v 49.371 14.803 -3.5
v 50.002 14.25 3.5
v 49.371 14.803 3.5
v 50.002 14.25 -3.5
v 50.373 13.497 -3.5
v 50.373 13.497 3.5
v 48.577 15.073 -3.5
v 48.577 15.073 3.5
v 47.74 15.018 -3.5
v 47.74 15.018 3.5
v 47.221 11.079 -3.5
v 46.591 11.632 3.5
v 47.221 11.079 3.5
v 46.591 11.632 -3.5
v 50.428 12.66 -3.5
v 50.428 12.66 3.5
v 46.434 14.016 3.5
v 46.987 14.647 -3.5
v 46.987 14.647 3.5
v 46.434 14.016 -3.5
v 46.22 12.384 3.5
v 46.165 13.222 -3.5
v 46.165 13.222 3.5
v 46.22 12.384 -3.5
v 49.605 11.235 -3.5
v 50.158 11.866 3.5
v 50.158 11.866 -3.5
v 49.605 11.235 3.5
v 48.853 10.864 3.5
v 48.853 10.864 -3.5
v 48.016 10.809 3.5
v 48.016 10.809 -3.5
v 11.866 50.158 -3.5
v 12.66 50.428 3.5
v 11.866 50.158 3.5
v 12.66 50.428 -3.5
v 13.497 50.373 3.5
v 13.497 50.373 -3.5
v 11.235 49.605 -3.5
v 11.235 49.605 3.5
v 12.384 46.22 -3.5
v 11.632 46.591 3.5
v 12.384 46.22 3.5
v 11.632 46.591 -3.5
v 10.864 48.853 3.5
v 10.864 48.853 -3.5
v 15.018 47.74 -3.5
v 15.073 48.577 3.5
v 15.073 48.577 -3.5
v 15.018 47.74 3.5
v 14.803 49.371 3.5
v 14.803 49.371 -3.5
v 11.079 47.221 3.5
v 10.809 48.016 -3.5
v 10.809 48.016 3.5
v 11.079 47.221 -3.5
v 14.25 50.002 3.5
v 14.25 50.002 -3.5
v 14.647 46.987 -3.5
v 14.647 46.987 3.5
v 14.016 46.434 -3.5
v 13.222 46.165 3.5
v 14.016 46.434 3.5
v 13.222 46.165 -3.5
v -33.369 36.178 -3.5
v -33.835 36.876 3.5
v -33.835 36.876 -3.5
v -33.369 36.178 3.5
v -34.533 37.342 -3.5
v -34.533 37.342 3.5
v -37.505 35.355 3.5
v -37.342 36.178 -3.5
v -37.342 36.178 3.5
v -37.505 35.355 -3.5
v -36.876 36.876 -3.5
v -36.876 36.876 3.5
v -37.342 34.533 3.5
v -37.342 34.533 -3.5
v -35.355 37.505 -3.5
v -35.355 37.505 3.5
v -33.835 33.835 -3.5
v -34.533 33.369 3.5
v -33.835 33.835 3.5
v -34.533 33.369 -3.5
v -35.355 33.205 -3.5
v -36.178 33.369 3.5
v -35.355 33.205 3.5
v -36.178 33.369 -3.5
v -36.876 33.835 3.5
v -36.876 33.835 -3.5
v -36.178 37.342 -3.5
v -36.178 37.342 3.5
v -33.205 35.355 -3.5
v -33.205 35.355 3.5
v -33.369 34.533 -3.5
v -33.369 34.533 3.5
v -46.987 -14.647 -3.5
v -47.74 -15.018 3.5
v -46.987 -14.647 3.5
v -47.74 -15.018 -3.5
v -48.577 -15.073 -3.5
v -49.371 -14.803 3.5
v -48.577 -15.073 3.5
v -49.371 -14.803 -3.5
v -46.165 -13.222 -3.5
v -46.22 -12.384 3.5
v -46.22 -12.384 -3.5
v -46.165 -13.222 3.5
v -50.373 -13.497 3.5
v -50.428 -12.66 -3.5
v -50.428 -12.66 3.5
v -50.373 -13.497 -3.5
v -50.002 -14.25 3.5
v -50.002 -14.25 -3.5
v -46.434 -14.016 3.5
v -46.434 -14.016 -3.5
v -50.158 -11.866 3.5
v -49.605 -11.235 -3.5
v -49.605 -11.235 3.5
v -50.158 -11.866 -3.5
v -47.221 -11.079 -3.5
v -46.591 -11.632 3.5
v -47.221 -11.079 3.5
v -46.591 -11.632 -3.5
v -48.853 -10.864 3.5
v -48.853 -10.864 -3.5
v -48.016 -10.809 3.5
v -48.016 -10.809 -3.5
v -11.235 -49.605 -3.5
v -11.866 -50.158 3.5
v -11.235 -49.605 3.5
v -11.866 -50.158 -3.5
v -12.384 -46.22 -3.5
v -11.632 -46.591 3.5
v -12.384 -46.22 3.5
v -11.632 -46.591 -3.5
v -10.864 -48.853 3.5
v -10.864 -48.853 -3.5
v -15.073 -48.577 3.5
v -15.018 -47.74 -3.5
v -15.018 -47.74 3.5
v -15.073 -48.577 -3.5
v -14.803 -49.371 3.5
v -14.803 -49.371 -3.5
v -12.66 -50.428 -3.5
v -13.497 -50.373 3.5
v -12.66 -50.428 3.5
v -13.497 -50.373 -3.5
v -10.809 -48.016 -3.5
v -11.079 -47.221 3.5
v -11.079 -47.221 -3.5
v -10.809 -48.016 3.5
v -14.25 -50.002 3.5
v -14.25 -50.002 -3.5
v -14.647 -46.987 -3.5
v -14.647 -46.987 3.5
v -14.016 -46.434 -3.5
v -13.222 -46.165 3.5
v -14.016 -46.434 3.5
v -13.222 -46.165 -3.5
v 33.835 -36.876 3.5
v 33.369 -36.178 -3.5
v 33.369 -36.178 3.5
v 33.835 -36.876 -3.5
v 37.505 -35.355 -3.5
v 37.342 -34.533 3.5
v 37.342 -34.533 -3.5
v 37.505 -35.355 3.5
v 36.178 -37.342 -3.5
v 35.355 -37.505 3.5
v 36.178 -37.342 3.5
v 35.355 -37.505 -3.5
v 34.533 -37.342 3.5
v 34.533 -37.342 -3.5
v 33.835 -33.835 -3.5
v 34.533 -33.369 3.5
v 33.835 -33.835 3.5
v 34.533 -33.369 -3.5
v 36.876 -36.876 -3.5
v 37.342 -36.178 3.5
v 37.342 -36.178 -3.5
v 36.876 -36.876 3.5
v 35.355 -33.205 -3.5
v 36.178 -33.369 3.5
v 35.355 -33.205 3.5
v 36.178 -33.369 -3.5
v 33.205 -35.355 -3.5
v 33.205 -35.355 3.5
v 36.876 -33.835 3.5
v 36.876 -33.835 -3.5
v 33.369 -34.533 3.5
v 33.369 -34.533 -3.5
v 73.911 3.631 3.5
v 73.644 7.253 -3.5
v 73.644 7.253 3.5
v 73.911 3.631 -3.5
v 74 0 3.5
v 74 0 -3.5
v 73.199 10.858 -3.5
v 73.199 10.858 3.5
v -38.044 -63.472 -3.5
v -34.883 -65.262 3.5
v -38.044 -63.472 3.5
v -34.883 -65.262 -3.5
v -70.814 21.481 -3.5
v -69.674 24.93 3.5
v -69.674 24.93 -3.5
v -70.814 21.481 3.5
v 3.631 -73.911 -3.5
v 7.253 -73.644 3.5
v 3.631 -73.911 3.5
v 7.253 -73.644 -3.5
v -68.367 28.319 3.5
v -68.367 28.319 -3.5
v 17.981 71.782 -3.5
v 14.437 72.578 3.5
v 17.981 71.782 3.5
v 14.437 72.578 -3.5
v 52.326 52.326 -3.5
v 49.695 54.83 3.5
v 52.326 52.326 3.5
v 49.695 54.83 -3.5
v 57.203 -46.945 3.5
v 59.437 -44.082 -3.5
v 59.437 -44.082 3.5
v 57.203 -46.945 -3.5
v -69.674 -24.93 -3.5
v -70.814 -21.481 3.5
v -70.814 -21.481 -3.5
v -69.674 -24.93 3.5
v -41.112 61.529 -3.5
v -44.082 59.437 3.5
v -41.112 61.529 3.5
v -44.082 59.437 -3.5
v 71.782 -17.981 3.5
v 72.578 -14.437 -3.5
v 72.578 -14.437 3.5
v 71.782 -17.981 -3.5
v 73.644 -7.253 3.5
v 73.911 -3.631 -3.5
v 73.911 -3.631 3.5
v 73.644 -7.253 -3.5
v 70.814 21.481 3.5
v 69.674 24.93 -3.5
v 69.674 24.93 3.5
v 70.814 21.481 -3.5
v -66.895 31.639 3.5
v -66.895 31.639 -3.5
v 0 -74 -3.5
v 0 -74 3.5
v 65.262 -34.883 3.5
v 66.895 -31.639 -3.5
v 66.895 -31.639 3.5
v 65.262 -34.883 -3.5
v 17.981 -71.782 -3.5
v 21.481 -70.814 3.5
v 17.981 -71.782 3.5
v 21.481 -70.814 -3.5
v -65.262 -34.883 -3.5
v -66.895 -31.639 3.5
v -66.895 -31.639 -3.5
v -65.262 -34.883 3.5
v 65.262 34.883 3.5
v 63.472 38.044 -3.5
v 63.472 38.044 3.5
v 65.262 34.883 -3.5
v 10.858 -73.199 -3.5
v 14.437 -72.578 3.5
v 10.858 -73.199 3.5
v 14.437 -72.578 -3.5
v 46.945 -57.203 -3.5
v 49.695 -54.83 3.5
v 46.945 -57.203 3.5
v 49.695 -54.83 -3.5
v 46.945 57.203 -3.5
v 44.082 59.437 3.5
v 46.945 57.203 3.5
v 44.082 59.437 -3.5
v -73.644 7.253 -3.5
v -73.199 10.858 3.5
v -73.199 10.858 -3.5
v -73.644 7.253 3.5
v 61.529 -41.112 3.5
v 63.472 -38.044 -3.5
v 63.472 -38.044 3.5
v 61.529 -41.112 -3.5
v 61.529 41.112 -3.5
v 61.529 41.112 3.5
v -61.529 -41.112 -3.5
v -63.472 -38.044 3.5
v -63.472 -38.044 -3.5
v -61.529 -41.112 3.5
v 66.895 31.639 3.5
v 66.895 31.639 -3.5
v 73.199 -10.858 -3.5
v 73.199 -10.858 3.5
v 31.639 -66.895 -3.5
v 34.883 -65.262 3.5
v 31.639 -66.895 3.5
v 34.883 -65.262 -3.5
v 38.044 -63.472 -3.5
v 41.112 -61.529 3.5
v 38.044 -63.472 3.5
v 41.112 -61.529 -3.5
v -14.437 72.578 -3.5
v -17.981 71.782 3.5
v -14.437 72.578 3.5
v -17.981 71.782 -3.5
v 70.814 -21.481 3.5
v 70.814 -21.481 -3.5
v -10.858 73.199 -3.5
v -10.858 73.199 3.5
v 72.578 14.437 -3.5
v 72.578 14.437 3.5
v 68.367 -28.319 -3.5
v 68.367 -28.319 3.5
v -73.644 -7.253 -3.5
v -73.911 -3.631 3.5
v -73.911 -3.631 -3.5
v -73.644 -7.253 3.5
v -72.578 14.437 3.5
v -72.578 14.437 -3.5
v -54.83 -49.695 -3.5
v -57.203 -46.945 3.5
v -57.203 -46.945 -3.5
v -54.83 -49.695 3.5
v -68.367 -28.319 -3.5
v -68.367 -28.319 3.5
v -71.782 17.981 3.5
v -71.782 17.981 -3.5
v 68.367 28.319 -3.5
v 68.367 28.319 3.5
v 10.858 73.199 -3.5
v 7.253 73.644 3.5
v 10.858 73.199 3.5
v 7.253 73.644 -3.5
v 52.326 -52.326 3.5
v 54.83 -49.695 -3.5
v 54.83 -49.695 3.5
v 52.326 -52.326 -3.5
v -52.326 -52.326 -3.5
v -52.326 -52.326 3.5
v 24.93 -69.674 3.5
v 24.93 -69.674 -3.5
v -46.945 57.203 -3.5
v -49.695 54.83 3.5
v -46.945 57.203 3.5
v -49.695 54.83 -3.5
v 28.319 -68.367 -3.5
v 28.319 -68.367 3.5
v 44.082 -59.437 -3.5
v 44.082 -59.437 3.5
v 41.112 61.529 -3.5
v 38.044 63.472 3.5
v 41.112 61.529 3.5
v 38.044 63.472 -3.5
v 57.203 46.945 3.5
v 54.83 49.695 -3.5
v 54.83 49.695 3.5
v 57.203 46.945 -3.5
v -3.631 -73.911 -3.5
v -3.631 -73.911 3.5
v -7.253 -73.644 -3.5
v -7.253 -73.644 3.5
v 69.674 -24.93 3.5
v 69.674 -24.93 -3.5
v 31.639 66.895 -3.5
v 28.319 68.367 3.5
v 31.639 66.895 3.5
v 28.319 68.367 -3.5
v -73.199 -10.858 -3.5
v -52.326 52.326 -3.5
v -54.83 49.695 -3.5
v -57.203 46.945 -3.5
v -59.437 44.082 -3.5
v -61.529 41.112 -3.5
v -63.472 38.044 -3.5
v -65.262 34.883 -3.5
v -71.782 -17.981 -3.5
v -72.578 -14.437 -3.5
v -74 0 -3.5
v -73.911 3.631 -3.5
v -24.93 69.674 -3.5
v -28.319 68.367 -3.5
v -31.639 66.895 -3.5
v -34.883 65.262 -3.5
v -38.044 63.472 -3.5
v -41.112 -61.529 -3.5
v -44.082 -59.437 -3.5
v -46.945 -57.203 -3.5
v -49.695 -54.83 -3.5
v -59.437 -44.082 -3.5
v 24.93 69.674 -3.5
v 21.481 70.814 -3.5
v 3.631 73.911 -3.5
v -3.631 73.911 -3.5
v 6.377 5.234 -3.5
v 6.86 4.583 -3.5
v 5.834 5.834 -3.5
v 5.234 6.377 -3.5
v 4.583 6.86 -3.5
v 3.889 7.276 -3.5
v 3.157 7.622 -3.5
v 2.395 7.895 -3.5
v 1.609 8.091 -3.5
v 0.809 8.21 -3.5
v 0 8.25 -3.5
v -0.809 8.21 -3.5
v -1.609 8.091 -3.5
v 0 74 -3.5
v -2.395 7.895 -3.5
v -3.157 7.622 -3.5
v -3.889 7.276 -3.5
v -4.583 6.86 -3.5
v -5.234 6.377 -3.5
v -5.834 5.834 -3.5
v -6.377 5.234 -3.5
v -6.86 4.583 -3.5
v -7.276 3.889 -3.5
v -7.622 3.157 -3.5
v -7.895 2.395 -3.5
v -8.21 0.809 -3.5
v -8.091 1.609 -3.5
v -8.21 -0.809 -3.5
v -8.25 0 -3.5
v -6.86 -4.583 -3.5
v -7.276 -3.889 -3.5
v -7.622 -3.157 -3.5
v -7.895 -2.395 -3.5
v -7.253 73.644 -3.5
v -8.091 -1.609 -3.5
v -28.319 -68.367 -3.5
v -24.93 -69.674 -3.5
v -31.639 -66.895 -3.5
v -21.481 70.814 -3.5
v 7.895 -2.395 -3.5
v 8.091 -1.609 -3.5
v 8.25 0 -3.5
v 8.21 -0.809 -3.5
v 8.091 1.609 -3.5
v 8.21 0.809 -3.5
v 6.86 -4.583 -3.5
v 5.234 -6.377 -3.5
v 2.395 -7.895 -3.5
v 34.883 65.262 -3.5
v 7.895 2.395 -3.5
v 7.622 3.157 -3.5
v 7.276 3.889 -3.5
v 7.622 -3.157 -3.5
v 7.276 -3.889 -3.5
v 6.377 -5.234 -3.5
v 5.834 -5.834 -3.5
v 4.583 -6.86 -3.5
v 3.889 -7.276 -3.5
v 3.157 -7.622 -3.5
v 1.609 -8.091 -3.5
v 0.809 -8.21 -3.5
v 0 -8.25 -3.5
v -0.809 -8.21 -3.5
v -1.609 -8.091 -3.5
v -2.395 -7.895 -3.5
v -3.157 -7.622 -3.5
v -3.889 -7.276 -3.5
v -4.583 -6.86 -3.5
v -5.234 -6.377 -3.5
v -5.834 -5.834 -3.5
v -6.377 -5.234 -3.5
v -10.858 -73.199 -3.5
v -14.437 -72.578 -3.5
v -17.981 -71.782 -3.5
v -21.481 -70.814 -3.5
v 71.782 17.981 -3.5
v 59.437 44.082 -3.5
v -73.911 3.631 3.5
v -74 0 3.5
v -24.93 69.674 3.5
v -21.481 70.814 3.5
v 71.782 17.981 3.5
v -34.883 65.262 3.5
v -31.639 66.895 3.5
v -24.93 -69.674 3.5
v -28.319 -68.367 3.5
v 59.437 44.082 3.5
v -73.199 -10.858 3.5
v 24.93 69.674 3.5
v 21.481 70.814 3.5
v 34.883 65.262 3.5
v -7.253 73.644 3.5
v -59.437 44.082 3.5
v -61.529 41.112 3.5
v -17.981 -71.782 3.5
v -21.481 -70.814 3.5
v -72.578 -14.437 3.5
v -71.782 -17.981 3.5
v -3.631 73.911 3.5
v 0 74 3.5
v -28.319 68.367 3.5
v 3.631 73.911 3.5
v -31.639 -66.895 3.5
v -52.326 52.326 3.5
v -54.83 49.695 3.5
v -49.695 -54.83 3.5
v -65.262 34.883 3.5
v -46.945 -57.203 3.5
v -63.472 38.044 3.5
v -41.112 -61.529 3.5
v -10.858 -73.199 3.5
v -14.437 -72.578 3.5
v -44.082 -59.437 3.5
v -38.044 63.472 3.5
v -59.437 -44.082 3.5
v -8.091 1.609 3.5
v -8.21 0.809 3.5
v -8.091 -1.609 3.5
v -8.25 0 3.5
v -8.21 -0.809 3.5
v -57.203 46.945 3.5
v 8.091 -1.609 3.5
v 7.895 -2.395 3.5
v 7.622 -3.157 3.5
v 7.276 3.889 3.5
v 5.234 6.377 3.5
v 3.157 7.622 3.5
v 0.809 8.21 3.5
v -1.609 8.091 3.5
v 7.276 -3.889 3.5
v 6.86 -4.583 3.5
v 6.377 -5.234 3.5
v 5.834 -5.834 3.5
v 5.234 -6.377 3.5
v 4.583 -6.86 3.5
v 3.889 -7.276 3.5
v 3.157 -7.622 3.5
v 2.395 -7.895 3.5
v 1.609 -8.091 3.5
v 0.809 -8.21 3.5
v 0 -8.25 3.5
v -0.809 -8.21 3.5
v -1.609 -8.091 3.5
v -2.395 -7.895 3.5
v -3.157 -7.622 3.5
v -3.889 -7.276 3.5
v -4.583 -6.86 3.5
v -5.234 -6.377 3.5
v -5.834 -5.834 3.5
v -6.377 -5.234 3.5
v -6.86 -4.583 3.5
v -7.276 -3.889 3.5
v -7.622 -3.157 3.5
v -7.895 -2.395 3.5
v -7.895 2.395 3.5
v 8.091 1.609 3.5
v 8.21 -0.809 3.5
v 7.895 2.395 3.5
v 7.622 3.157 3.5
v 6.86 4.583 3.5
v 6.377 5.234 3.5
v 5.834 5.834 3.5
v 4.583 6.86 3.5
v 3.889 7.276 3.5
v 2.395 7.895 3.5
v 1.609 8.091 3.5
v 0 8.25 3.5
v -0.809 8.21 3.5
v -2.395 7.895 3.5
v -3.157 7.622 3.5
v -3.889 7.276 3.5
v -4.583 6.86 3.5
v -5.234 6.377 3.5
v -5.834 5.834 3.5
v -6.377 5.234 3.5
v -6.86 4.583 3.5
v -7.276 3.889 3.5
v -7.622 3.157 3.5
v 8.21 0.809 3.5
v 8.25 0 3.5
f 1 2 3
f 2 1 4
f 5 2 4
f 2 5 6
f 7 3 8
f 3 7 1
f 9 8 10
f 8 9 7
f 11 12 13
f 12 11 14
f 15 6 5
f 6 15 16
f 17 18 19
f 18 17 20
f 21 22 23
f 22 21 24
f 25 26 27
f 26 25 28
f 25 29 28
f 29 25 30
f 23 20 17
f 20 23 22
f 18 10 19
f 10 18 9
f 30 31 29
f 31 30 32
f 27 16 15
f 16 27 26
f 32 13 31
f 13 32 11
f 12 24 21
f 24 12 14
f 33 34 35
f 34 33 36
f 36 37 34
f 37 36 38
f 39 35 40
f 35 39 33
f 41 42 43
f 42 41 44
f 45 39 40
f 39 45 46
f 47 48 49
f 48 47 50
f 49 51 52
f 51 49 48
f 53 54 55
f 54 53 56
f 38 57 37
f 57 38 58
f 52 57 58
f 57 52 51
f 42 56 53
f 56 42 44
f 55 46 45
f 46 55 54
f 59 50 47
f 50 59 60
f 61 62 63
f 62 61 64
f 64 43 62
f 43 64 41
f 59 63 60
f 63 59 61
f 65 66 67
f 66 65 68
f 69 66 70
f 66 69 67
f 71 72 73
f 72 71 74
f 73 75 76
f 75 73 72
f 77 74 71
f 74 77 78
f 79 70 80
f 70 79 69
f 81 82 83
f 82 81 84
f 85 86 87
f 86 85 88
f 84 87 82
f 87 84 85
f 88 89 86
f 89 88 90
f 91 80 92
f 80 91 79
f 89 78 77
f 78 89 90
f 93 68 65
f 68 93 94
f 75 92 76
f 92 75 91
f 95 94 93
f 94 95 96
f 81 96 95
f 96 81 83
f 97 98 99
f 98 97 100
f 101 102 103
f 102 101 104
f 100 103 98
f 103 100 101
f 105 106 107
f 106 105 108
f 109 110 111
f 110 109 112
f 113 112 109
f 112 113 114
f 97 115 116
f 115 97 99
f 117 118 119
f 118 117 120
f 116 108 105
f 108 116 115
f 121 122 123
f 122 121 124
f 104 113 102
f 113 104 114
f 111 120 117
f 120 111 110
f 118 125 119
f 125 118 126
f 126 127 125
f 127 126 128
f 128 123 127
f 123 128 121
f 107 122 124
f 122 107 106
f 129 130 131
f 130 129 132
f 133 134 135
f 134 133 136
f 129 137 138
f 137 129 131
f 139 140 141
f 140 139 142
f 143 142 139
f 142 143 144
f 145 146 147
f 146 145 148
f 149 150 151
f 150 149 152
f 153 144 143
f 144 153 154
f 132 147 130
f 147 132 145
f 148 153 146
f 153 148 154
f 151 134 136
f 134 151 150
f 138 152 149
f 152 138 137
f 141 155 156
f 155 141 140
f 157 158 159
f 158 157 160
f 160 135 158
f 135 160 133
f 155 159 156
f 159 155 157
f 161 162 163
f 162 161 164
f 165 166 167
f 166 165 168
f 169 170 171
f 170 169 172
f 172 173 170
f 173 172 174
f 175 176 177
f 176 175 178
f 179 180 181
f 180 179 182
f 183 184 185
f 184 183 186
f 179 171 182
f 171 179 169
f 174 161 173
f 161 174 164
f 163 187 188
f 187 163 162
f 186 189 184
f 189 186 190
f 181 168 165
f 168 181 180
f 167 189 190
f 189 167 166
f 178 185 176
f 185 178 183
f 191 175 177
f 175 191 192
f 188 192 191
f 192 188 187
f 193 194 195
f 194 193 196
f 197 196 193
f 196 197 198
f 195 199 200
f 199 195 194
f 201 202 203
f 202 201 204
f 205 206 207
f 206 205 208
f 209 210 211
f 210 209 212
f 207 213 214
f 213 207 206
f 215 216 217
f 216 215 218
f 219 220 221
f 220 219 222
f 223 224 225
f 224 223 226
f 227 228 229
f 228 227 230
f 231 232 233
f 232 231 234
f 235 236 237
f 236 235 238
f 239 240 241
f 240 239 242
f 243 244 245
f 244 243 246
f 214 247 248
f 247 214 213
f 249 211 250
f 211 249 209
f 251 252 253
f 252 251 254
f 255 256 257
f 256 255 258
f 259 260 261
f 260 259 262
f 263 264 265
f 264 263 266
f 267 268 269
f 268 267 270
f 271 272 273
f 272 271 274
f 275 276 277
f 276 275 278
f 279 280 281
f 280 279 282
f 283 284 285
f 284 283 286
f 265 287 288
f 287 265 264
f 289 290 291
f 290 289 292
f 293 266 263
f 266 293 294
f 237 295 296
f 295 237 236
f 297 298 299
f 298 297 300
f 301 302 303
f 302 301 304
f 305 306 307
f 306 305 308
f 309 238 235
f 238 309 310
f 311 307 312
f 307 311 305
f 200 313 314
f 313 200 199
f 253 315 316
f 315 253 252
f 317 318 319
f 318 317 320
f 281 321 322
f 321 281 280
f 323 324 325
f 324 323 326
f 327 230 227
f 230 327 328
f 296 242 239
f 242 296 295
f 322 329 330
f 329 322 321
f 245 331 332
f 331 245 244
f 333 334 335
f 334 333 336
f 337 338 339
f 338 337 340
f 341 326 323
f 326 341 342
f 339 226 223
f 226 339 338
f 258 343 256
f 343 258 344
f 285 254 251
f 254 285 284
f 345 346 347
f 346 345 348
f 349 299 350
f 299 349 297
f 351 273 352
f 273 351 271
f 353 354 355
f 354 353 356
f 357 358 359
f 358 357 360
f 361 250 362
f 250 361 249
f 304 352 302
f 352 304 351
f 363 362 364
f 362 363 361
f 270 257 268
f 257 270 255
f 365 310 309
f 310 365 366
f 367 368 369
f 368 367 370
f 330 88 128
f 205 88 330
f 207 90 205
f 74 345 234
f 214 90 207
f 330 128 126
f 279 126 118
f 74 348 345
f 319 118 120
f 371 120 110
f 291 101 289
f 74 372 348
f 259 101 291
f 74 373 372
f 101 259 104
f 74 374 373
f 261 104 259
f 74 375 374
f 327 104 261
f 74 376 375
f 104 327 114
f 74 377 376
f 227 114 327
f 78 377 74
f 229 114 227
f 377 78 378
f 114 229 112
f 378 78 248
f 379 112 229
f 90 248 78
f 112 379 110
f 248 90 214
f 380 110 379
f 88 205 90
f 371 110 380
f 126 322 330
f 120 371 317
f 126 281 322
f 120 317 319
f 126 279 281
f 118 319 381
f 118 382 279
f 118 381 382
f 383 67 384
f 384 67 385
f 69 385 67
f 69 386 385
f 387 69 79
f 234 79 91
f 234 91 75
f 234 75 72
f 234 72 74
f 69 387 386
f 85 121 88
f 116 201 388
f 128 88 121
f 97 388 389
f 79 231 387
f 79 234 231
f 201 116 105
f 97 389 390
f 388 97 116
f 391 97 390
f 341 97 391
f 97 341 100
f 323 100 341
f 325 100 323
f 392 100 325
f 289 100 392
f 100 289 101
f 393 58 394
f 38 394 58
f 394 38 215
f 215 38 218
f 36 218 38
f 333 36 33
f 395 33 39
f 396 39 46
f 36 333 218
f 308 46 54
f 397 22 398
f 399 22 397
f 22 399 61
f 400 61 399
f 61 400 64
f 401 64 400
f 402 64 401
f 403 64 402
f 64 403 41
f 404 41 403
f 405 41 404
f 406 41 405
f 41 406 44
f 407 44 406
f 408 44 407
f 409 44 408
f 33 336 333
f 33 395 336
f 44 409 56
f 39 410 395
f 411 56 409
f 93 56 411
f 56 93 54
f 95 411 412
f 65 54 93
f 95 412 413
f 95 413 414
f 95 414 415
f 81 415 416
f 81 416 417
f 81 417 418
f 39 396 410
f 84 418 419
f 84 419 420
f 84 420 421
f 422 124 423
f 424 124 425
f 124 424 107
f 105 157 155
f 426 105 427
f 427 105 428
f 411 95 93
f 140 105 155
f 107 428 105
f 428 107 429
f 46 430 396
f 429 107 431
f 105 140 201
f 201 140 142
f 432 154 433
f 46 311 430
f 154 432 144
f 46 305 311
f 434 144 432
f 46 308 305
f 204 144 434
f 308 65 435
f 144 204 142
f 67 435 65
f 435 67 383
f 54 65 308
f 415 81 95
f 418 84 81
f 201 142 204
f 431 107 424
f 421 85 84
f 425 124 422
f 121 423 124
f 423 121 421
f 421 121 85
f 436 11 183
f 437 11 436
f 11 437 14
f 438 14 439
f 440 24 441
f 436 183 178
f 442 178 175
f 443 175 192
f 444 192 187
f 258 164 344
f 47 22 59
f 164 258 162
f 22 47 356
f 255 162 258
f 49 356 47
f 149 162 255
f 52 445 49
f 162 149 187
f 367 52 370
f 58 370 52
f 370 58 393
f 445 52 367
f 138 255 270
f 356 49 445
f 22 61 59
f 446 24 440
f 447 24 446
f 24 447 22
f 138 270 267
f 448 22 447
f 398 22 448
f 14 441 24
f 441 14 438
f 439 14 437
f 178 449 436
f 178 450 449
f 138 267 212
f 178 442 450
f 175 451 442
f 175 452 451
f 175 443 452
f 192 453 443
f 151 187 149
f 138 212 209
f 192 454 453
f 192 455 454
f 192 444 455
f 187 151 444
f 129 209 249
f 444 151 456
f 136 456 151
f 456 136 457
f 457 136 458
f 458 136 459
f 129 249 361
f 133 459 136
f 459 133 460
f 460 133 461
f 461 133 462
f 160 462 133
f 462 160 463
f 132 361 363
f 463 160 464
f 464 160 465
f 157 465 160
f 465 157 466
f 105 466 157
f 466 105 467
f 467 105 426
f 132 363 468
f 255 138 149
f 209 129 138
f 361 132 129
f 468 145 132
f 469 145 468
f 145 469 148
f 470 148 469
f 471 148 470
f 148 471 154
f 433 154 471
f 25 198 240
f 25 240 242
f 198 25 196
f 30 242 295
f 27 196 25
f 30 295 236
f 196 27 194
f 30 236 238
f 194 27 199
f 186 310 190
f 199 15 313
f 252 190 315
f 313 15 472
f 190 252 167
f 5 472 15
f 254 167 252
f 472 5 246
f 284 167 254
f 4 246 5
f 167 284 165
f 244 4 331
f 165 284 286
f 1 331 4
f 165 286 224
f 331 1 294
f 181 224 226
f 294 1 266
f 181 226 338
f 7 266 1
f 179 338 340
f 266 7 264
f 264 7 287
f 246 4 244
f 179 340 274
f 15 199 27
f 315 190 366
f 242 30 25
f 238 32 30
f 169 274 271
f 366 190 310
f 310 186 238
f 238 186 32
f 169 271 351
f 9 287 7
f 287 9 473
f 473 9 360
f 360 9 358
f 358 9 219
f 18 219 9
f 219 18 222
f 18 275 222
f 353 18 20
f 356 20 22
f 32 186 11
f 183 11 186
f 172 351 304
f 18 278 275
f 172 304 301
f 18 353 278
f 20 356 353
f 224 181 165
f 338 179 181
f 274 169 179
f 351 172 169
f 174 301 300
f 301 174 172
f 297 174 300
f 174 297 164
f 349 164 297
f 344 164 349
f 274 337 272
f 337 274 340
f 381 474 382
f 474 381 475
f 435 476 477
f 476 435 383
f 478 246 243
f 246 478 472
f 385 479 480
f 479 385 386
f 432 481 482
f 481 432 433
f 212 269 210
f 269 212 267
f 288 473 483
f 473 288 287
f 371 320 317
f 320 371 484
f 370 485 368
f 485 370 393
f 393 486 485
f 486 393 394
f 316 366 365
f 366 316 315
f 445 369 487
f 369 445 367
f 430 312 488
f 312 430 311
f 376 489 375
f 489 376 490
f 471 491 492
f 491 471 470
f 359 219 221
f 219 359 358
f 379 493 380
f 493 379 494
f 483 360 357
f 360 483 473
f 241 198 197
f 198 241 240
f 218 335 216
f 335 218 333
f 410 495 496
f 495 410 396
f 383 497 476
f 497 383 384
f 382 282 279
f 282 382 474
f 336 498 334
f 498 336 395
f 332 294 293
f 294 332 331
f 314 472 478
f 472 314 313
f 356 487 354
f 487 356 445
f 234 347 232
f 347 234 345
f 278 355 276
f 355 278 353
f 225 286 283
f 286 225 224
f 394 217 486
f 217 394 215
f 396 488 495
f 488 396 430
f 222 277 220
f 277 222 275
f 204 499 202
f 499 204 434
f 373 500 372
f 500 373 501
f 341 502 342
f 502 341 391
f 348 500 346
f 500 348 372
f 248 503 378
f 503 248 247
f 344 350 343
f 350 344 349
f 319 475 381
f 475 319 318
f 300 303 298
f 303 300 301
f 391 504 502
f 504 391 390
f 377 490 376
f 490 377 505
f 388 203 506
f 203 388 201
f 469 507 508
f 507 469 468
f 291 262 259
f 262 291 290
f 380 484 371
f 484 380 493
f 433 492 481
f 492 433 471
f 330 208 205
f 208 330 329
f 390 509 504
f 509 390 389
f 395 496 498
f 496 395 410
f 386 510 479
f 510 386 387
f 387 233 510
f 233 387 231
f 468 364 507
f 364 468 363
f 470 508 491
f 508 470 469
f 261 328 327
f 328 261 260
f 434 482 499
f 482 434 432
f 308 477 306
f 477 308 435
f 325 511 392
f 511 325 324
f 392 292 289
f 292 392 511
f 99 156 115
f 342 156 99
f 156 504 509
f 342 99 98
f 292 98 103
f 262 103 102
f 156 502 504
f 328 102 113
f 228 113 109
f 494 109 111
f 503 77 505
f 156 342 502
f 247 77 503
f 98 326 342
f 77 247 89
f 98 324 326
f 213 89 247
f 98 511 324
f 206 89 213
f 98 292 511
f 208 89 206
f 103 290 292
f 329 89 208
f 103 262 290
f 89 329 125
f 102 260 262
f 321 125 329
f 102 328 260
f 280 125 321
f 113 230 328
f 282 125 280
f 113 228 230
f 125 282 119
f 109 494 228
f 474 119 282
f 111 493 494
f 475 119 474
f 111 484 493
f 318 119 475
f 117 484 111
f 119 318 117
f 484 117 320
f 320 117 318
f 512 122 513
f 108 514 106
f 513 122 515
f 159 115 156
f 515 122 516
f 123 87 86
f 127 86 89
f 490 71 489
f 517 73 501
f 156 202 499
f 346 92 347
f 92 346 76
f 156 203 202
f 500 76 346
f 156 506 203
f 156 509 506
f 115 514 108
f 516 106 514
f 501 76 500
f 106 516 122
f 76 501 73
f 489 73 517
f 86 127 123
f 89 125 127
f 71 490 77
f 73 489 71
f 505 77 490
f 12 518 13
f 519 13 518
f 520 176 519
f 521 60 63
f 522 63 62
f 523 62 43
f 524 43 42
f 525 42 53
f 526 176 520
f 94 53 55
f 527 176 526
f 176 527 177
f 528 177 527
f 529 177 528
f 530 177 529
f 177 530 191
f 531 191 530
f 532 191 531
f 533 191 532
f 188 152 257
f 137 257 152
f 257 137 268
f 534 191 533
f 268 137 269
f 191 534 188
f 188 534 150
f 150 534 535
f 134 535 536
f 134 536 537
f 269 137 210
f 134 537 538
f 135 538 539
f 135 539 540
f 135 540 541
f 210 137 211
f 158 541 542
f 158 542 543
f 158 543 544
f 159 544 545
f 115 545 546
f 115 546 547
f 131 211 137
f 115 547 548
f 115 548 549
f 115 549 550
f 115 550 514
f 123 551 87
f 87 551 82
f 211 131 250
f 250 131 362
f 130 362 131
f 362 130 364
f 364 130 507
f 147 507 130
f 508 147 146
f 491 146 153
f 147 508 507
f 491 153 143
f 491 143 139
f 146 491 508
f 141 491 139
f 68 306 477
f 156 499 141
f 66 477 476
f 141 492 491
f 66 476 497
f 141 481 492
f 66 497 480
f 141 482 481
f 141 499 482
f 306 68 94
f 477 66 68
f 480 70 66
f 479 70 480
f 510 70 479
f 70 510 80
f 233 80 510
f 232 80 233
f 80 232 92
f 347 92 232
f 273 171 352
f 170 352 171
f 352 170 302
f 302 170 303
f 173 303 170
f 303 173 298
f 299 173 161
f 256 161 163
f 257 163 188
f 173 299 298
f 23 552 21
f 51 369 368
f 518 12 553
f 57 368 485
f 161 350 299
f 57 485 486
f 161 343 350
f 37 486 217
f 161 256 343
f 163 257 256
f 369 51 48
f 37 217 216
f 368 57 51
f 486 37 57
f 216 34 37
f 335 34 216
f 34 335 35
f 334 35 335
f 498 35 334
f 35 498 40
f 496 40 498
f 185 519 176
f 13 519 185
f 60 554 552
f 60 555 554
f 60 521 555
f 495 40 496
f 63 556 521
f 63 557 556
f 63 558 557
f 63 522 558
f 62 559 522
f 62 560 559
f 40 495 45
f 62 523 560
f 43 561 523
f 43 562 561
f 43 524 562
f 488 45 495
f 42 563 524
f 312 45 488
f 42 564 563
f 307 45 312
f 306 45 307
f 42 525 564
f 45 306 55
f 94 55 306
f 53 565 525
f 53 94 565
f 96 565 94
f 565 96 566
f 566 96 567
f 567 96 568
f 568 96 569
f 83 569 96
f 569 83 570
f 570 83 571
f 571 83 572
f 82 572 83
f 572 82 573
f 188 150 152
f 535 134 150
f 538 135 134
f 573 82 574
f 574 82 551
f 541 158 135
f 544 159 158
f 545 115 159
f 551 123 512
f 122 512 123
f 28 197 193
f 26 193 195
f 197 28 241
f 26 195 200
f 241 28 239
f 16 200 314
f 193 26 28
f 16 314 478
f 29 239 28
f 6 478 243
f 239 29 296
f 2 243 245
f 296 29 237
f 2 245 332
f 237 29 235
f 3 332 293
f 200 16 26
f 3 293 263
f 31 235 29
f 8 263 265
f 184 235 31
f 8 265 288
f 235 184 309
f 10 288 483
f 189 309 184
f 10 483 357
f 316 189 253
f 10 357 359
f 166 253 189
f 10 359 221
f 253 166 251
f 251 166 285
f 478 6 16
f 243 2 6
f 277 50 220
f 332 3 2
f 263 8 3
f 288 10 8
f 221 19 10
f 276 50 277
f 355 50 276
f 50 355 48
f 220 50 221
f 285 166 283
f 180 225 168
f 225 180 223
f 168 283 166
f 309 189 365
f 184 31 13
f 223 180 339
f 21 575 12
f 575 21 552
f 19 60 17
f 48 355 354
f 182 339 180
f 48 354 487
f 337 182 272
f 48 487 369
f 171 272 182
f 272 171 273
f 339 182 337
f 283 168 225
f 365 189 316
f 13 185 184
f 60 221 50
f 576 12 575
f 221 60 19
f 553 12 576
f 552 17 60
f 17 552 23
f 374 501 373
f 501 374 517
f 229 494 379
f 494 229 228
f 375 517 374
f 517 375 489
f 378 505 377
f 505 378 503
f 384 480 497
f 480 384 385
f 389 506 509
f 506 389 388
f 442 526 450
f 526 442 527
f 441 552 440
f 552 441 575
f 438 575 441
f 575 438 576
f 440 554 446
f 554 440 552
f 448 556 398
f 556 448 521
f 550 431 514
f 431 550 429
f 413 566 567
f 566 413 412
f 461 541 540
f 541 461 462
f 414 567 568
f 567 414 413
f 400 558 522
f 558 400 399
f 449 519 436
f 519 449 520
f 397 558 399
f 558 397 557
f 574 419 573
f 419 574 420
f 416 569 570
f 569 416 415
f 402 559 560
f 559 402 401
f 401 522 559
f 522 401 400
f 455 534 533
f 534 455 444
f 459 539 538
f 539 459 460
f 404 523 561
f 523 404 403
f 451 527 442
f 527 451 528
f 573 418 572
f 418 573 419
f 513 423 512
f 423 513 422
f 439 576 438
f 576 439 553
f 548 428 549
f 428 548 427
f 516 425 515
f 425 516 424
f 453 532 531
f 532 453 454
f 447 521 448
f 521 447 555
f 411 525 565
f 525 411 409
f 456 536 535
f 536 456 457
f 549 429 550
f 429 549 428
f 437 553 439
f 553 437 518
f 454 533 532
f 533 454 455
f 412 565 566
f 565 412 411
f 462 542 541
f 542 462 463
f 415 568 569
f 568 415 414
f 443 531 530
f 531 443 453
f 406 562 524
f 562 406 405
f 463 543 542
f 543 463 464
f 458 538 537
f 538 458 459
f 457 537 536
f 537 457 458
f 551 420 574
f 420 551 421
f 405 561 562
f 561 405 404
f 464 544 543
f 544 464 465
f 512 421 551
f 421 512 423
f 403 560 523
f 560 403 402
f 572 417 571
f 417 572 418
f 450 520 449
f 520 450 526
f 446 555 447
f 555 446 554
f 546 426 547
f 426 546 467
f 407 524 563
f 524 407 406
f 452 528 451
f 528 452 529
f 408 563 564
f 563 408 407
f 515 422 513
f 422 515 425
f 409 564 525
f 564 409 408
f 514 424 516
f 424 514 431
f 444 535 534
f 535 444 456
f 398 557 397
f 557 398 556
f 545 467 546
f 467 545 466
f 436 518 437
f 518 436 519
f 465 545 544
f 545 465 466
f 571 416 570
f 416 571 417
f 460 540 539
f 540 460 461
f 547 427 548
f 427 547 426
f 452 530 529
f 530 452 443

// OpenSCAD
/*
 * CD/DVD Version - End Clamp Plates
 * Larger diameter to match 120mm discs.
 */

module cd_dvd_end_plate(thickness=7) {
    difference() {
        cylinder(d=120 + 28, h=thickness, center=true, $fn=128);
        
        // Central hole sized for CD/DVD hub
        cylinder(d=16.5, h=thickness + 1, center=true, $fn=64);
        
        // 6x M4 bolt holes
        for (i = [0:5]) {
            rotate([0, 0, i*60 + 15])
                translate([120/2 - 10, 0, 0])
                    cylinder(d=4.3, h=thickness+2, center=true, $fn=16);
        }
    }
}

cd_dvd_end_plate(7);
